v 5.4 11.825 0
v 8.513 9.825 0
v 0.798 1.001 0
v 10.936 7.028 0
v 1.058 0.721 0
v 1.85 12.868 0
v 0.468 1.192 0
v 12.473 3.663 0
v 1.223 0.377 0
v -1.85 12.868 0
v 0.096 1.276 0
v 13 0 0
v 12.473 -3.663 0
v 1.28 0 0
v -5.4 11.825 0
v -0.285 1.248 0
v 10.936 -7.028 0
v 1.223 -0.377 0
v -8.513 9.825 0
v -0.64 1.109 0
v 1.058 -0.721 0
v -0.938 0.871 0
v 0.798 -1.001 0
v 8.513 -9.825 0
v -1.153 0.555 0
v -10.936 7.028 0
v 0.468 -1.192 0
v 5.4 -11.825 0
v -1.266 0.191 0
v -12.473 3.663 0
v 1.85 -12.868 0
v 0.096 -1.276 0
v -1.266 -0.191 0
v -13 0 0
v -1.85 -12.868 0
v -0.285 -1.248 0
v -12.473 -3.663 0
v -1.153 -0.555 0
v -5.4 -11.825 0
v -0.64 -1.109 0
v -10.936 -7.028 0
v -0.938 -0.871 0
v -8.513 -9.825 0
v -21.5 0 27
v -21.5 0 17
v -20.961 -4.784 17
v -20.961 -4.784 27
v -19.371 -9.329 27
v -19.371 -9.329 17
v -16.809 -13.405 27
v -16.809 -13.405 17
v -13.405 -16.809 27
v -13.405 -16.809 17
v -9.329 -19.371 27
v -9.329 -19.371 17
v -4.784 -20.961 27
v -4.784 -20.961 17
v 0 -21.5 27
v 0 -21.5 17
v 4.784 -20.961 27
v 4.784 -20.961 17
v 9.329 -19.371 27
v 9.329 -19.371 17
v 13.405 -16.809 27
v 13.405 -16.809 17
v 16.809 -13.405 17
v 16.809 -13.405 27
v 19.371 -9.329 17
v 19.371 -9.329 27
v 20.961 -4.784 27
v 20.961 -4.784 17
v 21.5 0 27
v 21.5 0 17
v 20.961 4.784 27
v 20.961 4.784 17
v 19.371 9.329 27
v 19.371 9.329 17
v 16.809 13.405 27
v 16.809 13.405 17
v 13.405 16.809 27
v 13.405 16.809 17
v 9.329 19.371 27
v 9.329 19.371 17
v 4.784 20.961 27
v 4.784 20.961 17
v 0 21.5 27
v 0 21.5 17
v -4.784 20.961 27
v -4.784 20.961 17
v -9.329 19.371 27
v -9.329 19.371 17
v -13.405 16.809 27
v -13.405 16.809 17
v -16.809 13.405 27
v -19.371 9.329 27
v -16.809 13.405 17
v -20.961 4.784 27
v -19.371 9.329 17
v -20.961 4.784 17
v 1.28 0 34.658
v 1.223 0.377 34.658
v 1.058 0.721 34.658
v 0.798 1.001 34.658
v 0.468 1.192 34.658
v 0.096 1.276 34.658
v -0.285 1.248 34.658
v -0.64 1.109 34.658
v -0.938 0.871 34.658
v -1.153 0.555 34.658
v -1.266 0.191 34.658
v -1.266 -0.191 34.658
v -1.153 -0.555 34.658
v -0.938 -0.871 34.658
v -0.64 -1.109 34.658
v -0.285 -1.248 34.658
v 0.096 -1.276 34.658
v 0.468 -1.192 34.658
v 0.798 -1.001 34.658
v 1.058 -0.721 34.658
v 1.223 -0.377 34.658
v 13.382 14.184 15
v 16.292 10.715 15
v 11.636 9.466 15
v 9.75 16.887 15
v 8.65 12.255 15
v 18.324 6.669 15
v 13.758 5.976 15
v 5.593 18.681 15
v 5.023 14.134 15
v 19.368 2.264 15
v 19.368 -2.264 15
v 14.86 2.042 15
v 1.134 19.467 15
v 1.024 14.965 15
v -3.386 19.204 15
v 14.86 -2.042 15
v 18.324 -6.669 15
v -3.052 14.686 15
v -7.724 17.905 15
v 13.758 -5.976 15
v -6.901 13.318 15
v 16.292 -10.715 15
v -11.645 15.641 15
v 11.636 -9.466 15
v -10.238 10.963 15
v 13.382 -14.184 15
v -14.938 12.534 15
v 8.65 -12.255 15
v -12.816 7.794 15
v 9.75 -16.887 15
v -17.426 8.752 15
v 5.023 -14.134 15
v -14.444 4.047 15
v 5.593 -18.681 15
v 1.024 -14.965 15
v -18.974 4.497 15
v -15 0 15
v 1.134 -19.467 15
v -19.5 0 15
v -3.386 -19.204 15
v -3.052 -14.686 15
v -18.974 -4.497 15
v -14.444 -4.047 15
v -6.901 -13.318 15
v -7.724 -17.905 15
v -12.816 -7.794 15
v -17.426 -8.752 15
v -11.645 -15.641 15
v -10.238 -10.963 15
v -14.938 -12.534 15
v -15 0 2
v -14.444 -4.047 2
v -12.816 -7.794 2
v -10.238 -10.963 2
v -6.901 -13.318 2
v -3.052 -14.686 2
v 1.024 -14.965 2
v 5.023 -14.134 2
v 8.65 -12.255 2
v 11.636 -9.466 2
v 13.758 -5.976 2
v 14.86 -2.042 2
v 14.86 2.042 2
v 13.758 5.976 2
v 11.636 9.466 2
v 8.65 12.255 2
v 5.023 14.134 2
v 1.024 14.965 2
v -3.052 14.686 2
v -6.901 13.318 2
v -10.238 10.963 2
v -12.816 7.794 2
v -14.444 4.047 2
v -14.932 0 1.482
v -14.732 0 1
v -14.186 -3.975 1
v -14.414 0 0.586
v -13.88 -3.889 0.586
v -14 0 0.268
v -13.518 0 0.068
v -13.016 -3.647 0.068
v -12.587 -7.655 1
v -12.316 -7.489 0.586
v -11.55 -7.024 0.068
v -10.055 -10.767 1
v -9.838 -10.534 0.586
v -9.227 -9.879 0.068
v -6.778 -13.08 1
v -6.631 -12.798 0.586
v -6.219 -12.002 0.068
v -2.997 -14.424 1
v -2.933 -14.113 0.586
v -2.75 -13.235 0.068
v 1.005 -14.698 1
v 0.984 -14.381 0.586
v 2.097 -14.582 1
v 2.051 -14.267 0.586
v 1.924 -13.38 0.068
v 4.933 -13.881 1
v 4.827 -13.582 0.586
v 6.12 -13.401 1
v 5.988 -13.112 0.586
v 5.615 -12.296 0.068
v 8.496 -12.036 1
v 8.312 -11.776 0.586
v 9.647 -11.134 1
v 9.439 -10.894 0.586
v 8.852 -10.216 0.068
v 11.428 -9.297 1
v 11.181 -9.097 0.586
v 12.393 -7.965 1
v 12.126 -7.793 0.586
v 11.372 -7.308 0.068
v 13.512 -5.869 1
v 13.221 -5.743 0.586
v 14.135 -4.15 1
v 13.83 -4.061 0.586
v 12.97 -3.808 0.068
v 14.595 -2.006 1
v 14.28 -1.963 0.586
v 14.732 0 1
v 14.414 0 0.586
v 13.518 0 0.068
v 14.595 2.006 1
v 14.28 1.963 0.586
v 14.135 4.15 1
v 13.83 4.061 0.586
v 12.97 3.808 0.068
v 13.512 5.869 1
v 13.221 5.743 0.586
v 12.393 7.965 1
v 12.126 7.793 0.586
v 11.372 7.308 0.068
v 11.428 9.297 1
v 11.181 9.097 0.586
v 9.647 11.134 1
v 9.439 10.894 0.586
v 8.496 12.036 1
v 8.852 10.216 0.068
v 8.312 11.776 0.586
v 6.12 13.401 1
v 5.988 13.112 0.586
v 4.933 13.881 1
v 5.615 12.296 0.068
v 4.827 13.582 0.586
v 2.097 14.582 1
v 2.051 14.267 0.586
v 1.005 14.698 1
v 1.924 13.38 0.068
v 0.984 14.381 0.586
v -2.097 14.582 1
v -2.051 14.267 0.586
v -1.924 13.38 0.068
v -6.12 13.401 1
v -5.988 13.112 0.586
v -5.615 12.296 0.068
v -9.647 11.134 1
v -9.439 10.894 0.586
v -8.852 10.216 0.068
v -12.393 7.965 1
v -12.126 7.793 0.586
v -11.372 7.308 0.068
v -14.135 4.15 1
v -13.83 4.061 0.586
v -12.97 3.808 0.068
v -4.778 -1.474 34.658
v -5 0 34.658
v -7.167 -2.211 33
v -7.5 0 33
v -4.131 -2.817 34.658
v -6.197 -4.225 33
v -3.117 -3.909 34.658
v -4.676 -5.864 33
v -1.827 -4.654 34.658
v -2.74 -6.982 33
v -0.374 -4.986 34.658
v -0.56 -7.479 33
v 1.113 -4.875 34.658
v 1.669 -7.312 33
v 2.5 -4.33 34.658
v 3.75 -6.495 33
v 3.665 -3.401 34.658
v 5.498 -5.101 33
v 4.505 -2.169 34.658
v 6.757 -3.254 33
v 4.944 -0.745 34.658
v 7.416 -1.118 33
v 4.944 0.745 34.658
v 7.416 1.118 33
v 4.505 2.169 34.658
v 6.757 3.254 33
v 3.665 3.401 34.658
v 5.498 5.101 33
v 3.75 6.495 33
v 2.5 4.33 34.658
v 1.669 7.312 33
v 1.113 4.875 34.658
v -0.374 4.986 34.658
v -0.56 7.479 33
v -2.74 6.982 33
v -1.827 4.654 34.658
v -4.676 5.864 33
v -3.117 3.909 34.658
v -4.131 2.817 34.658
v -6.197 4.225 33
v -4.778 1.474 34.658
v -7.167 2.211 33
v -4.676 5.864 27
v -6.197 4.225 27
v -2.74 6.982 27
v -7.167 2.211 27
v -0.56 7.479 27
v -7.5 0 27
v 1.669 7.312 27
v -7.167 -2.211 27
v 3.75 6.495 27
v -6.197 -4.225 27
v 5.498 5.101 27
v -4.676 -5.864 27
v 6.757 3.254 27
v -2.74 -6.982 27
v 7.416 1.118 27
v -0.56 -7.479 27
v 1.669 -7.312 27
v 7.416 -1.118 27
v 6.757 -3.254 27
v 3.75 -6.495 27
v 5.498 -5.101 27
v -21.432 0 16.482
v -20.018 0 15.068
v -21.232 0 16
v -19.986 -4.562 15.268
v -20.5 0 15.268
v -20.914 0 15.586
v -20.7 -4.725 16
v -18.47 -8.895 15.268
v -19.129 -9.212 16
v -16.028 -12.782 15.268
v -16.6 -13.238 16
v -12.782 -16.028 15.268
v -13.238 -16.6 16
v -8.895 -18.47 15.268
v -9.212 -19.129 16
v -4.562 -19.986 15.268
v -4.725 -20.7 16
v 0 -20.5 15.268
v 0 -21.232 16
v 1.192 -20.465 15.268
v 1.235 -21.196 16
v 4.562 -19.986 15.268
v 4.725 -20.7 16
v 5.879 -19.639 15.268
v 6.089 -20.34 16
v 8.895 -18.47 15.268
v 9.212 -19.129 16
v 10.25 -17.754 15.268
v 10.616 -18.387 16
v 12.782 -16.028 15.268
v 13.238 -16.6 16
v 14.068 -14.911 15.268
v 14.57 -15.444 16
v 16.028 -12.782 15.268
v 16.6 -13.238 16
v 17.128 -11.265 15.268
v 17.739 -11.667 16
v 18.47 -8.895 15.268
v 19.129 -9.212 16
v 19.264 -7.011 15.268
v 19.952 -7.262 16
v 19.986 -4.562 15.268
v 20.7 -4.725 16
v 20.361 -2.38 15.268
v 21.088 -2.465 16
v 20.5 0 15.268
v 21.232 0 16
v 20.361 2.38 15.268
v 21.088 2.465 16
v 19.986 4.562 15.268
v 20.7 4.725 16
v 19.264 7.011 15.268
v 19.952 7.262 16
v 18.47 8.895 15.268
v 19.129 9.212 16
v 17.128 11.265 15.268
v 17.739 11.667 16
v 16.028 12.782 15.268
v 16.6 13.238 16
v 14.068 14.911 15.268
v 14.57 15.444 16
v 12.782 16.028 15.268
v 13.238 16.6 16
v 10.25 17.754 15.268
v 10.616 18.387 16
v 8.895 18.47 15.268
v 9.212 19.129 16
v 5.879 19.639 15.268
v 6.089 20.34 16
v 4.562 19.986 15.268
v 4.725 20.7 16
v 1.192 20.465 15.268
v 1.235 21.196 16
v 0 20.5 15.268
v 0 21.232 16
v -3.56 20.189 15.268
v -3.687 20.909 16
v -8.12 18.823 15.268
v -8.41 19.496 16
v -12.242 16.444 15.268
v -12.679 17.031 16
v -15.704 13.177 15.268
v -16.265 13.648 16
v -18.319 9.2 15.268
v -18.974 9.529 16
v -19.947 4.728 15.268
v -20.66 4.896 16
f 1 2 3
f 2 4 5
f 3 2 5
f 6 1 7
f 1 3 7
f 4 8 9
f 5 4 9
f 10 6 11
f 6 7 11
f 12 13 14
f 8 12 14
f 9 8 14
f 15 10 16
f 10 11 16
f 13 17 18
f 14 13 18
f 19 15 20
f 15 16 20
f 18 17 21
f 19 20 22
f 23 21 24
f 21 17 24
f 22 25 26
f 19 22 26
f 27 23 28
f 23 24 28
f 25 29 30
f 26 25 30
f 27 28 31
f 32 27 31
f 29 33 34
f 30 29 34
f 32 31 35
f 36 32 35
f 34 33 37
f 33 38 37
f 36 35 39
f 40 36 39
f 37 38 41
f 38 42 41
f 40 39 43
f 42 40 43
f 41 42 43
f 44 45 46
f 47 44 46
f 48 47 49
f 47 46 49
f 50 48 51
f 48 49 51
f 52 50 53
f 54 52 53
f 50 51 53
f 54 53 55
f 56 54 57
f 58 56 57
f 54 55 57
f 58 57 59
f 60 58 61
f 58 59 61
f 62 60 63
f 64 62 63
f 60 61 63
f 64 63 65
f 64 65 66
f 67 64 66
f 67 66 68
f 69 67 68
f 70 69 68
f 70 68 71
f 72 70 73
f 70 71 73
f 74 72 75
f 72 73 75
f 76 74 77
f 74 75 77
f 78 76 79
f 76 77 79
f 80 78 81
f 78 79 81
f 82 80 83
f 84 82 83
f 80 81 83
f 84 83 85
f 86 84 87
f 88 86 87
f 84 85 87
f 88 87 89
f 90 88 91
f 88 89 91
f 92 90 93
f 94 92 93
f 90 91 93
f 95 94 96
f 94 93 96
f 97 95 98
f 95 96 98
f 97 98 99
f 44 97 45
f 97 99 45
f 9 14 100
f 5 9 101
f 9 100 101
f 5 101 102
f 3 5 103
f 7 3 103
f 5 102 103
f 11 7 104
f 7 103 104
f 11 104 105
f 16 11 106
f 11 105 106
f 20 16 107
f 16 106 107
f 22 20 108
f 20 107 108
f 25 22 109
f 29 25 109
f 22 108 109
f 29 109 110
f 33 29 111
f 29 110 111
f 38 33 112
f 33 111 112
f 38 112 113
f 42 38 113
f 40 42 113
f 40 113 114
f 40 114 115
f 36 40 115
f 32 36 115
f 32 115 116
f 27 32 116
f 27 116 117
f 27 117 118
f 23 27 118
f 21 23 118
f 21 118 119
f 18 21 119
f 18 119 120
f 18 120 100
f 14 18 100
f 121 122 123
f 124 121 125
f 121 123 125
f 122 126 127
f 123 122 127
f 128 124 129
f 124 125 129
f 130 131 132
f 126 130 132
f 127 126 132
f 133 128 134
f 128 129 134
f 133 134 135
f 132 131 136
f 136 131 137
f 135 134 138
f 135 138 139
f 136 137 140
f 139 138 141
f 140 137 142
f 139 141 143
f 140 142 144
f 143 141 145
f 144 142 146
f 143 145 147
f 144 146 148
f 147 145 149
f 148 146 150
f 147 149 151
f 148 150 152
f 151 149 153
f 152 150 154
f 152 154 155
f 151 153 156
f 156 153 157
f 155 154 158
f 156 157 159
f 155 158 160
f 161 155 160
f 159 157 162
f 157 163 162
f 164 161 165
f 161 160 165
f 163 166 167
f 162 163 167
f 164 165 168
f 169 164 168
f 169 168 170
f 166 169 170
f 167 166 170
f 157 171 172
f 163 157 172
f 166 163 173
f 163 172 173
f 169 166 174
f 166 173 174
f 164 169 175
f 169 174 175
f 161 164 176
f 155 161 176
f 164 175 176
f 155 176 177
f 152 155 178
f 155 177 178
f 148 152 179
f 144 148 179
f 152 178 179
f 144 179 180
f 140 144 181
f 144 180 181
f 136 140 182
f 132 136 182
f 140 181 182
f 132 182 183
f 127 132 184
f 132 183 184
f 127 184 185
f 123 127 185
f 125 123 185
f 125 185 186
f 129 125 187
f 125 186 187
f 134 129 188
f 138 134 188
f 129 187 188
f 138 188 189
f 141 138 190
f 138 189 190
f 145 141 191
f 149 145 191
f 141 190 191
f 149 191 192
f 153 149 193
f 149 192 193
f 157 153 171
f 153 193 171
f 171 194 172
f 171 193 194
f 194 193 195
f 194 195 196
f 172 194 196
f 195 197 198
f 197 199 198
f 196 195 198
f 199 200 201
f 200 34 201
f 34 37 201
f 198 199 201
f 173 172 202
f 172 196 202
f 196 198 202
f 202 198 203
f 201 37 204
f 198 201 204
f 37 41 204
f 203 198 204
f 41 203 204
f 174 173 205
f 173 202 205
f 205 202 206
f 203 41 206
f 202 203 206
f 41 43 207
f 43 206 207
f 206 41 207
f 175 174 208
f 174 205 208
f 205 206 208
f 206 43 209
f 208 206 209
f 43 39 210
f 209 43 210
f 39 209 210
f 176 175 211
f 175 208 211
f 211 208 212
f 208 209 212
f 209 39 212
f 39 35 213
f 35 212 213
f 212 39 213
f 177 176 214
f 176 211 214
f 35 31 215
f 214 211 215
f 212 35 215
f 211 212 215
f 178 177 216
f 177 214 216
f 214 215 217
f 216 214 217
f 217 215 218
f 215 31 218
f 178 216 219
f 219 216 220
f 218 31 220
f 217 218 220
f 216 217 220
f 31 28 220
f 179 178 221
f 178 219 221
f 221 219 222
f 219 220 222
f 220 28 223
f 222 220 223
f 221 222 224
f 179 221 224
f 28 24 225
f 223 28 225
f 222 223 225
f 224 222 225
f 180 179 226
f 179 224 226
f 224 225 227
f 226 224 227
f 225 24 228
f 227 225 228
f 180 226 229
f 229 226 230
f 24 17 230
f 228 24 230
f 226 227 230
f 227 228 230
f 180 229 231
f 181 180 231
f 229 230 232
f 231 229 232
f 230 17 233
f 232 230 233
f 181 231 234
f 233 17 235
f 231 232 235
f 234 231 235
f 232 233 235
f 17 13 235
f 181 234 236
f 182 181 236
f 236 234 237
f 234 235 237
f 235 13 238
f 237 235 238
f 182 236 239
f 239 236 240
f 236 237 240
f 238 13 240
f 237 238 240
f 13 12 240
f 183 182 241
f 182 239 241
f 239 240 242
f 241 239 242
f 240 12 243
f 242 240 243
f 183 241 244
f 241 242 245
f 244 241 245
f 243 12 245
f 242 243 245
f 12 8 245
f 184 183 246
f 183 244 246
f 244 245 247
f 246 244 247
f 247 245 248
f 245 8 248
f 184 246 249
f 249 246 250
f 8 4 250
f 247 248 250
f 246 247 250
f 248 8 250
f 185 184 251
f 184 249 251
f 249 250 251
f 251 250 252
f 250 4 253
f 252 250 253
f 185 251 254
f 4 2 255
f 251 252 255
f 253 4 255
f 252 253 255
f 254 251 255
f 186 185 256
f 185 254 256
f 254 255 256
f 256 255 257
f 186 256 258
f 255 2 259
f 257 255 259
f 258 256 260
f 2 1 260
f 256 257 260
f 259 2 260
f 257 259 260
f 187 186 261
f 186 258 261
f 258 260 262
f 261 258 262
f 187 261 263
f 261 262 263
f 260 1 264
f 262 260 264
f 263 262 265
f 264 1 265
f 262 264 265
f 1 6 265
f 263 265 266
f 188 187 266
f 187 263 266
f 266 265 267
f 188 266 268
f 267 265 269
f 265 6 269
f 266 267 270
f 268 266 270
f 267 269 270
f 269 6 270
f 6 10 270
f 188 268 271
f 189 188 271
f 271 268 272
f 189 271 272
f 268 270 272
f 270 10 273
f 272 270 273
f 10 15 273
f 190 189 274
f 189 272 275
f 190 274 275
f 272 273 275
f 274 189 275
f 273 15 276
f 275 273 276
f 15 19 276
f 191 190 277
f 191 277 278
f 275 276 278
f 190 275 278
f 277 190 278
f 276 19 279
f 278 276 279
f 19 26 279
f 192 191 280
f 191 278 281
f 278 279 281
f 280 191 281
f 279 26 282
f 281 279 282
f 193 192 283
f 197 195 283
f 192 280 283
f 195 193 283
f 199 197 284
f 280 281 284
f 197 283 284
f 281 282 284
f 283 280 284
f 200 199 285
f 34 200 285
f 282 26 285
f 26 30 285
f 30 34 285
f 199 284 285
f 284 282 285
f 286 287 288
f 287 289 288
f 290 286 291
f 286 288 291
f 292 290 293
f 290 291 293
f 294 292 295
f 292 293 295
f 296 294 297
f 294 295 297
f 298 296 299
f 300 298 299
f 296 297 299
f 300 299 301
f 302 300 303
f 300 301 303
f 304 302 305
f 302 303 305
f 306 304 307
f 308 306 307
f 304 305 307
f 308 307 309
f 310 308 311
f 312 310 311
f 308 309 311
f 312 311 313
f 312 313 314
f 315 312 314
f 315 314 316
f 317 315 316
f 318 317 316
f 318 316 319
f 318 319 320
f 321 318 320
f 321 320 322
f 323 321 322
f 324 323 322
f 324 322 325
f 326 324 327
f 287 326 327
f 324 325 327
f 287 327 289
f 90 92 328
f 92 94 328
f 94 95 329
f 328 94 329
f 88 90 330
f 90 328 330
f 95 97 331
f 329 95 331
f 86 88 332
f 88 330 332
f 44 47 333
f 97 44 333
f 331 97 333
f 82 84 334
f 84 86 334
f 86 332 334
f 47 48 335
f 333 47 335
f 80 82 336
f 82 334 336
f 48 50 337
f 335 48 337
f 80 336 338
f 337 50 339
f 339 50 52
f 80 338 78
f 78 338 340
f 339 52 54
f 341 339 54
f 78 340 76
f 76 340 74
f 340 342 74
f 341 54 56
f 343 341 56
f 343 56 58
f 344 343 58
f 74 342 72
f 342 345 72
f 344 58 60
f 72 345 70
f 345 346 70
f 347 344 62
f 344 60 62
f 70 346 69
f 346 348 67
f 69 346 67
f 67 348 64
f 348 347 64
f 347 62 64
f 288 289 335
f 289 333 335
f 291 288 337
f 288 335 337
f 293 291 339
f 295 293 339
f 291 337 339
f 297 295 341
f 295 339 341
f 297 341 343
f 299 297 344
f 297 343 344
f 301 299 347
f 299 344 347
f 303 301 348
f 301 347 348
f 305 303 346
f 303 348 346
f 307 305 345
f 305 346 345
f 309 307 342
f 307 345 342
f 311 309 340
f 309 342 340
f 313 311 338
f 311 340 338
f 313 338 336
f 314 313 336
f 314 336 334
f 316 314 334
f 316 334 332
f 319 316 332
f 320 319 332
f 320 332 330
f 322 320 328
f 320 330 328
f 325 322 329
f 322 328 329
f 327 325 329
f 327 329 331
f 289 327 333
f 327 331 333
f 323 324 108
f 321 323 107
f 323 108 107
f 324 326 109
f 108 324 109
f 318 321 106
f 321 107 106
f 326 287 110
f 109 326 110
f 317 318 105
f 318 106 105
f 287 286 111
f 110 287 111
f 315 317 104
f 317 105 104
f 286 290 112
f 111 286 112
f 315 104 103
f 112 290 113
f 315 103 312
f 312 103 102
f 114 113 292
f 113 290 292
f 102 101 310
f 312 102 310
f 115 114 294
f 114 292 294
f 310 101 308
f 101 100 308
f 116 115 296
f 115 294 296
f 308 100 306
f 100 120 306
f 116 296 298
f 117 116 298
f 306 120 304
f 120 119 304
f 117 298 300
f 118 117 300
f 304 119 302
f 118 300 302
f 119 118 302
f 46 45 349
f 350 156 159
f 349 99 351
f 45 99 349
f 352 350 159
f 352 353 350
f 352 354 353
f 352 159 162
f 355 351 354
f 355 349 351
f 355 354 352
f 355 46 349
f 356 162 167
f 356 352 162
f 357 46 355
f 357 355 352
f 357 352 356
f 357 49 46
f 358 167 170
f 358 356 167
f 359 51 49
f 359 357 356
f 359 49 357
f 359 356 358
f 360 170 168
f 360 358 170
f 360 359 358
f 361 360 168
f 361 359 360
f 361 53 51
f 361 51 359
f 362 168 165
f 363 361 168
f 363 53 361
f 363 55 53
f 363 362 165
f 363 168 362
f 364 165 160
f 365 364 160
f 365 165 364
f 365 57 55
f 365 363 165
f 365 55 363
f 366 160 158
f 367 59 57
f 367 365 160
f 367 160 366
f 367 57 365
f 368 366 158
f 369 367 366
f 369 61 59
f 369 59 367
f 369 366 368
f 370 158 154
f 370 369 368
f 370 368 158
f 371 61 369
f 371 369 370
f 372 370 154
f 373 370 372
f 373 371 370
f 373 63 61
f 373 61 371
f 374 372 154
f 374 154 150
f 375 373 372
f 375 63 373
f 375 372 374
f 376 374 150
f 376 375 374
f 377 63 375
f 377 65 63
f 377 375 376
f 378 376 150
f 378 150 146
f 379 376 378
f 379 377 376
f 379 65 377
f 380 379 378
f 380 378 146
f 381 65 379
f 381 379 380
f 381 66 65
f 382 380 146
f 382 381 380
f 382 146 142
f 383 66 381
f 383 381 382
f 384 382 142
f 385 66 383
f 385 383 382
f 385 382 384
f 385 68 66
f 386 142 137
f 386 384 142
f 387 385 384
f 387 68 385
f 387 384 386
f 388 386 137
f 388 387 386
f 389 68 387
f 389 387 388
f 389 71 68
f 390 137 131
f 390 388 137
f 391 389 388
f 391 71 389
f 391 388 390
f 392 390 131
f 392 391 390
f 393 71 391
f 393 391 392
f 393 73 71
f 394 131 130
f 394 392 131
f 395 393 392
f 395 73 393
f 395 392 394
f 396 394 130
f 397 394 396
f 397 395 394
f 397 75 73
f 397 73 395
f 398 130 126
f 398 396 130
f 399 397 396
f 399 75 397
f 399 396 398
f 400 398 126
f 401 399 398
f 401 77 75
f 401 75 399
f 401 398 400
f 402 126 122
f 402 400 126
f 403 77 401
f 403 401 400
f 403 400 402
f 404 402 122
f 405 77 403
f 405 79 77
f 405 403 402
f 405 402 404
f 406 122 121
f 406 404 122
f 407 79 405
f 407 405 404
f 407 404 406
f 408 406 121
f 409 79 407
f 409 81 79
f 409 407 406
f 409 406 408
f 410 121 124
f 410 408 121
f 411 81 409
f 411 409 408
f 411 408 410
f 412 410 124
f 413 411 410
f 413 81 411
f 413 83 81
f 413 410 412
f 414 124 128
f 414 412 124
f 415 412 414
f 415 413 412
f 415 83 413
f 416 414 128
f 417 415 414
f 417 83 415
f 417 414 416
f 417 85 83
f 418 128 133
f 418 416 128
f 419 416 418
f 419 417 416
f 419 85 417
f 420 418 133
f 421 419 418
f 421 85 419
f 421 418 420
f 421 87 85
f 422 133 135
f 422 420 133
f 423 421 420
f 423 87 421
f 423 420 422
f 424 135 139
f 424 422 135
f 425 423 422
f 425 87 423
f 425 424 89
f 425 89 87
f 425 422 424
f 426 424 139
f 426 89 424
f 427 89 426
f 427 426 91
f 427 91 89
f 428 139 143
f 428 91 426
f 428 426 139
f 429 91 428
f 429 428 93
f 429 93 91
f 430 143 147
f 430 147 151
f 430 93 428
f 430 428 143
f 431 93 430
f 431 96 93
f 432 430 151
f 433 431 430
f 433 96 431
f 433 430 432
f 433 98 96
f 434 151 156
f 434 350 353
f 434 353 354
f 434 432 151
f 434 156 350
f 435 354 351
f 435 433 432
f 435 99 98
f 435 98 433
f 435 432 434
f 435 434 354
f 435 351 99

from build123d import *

# Parameters (mm, degrees)
F2_R     = 1.28
F3_DEPTH = 34.659312
F4_R     = 2
F5_R     = 2


with BuildPart() as f1:
    # F0 (on Front) → F1 (revolve)
    with BuildSketch(Plane.XZ):
        Polygon((-15, 0), (0, 0), (0, 34.658312), (-5, 34.658312), (-7.5, 33), (-7.5, 27), (-21.5, 27), (-21.5, 15), (-15, 15), align=None)
    revolve(axis=Axis((0, 0, 25.863634), (0, 0, 1)))

    # F2 (on face) → F3 (cut, through all)
    with BuildSketch(Plane.XY.offset(34.658312)):
        Circle(F2_R)
    extrude(amount=-F3_DEPTH, mode=Mode.SUBTRACT)

    # F4
    f4_edges = [f1.edges().sort_by_distance(p)[0] for p in [
        (21.5, 0, 15),
    ]]
    fillet(f4_edges, radius=F4_R)

    # F5
    f5_edges = [f1.edges().sort_by_distance(p)[0] for p in [
        (15, 0, 0),
    ]]
    fillet(f5_edges, radius=F5_R)


solid = f1.part
